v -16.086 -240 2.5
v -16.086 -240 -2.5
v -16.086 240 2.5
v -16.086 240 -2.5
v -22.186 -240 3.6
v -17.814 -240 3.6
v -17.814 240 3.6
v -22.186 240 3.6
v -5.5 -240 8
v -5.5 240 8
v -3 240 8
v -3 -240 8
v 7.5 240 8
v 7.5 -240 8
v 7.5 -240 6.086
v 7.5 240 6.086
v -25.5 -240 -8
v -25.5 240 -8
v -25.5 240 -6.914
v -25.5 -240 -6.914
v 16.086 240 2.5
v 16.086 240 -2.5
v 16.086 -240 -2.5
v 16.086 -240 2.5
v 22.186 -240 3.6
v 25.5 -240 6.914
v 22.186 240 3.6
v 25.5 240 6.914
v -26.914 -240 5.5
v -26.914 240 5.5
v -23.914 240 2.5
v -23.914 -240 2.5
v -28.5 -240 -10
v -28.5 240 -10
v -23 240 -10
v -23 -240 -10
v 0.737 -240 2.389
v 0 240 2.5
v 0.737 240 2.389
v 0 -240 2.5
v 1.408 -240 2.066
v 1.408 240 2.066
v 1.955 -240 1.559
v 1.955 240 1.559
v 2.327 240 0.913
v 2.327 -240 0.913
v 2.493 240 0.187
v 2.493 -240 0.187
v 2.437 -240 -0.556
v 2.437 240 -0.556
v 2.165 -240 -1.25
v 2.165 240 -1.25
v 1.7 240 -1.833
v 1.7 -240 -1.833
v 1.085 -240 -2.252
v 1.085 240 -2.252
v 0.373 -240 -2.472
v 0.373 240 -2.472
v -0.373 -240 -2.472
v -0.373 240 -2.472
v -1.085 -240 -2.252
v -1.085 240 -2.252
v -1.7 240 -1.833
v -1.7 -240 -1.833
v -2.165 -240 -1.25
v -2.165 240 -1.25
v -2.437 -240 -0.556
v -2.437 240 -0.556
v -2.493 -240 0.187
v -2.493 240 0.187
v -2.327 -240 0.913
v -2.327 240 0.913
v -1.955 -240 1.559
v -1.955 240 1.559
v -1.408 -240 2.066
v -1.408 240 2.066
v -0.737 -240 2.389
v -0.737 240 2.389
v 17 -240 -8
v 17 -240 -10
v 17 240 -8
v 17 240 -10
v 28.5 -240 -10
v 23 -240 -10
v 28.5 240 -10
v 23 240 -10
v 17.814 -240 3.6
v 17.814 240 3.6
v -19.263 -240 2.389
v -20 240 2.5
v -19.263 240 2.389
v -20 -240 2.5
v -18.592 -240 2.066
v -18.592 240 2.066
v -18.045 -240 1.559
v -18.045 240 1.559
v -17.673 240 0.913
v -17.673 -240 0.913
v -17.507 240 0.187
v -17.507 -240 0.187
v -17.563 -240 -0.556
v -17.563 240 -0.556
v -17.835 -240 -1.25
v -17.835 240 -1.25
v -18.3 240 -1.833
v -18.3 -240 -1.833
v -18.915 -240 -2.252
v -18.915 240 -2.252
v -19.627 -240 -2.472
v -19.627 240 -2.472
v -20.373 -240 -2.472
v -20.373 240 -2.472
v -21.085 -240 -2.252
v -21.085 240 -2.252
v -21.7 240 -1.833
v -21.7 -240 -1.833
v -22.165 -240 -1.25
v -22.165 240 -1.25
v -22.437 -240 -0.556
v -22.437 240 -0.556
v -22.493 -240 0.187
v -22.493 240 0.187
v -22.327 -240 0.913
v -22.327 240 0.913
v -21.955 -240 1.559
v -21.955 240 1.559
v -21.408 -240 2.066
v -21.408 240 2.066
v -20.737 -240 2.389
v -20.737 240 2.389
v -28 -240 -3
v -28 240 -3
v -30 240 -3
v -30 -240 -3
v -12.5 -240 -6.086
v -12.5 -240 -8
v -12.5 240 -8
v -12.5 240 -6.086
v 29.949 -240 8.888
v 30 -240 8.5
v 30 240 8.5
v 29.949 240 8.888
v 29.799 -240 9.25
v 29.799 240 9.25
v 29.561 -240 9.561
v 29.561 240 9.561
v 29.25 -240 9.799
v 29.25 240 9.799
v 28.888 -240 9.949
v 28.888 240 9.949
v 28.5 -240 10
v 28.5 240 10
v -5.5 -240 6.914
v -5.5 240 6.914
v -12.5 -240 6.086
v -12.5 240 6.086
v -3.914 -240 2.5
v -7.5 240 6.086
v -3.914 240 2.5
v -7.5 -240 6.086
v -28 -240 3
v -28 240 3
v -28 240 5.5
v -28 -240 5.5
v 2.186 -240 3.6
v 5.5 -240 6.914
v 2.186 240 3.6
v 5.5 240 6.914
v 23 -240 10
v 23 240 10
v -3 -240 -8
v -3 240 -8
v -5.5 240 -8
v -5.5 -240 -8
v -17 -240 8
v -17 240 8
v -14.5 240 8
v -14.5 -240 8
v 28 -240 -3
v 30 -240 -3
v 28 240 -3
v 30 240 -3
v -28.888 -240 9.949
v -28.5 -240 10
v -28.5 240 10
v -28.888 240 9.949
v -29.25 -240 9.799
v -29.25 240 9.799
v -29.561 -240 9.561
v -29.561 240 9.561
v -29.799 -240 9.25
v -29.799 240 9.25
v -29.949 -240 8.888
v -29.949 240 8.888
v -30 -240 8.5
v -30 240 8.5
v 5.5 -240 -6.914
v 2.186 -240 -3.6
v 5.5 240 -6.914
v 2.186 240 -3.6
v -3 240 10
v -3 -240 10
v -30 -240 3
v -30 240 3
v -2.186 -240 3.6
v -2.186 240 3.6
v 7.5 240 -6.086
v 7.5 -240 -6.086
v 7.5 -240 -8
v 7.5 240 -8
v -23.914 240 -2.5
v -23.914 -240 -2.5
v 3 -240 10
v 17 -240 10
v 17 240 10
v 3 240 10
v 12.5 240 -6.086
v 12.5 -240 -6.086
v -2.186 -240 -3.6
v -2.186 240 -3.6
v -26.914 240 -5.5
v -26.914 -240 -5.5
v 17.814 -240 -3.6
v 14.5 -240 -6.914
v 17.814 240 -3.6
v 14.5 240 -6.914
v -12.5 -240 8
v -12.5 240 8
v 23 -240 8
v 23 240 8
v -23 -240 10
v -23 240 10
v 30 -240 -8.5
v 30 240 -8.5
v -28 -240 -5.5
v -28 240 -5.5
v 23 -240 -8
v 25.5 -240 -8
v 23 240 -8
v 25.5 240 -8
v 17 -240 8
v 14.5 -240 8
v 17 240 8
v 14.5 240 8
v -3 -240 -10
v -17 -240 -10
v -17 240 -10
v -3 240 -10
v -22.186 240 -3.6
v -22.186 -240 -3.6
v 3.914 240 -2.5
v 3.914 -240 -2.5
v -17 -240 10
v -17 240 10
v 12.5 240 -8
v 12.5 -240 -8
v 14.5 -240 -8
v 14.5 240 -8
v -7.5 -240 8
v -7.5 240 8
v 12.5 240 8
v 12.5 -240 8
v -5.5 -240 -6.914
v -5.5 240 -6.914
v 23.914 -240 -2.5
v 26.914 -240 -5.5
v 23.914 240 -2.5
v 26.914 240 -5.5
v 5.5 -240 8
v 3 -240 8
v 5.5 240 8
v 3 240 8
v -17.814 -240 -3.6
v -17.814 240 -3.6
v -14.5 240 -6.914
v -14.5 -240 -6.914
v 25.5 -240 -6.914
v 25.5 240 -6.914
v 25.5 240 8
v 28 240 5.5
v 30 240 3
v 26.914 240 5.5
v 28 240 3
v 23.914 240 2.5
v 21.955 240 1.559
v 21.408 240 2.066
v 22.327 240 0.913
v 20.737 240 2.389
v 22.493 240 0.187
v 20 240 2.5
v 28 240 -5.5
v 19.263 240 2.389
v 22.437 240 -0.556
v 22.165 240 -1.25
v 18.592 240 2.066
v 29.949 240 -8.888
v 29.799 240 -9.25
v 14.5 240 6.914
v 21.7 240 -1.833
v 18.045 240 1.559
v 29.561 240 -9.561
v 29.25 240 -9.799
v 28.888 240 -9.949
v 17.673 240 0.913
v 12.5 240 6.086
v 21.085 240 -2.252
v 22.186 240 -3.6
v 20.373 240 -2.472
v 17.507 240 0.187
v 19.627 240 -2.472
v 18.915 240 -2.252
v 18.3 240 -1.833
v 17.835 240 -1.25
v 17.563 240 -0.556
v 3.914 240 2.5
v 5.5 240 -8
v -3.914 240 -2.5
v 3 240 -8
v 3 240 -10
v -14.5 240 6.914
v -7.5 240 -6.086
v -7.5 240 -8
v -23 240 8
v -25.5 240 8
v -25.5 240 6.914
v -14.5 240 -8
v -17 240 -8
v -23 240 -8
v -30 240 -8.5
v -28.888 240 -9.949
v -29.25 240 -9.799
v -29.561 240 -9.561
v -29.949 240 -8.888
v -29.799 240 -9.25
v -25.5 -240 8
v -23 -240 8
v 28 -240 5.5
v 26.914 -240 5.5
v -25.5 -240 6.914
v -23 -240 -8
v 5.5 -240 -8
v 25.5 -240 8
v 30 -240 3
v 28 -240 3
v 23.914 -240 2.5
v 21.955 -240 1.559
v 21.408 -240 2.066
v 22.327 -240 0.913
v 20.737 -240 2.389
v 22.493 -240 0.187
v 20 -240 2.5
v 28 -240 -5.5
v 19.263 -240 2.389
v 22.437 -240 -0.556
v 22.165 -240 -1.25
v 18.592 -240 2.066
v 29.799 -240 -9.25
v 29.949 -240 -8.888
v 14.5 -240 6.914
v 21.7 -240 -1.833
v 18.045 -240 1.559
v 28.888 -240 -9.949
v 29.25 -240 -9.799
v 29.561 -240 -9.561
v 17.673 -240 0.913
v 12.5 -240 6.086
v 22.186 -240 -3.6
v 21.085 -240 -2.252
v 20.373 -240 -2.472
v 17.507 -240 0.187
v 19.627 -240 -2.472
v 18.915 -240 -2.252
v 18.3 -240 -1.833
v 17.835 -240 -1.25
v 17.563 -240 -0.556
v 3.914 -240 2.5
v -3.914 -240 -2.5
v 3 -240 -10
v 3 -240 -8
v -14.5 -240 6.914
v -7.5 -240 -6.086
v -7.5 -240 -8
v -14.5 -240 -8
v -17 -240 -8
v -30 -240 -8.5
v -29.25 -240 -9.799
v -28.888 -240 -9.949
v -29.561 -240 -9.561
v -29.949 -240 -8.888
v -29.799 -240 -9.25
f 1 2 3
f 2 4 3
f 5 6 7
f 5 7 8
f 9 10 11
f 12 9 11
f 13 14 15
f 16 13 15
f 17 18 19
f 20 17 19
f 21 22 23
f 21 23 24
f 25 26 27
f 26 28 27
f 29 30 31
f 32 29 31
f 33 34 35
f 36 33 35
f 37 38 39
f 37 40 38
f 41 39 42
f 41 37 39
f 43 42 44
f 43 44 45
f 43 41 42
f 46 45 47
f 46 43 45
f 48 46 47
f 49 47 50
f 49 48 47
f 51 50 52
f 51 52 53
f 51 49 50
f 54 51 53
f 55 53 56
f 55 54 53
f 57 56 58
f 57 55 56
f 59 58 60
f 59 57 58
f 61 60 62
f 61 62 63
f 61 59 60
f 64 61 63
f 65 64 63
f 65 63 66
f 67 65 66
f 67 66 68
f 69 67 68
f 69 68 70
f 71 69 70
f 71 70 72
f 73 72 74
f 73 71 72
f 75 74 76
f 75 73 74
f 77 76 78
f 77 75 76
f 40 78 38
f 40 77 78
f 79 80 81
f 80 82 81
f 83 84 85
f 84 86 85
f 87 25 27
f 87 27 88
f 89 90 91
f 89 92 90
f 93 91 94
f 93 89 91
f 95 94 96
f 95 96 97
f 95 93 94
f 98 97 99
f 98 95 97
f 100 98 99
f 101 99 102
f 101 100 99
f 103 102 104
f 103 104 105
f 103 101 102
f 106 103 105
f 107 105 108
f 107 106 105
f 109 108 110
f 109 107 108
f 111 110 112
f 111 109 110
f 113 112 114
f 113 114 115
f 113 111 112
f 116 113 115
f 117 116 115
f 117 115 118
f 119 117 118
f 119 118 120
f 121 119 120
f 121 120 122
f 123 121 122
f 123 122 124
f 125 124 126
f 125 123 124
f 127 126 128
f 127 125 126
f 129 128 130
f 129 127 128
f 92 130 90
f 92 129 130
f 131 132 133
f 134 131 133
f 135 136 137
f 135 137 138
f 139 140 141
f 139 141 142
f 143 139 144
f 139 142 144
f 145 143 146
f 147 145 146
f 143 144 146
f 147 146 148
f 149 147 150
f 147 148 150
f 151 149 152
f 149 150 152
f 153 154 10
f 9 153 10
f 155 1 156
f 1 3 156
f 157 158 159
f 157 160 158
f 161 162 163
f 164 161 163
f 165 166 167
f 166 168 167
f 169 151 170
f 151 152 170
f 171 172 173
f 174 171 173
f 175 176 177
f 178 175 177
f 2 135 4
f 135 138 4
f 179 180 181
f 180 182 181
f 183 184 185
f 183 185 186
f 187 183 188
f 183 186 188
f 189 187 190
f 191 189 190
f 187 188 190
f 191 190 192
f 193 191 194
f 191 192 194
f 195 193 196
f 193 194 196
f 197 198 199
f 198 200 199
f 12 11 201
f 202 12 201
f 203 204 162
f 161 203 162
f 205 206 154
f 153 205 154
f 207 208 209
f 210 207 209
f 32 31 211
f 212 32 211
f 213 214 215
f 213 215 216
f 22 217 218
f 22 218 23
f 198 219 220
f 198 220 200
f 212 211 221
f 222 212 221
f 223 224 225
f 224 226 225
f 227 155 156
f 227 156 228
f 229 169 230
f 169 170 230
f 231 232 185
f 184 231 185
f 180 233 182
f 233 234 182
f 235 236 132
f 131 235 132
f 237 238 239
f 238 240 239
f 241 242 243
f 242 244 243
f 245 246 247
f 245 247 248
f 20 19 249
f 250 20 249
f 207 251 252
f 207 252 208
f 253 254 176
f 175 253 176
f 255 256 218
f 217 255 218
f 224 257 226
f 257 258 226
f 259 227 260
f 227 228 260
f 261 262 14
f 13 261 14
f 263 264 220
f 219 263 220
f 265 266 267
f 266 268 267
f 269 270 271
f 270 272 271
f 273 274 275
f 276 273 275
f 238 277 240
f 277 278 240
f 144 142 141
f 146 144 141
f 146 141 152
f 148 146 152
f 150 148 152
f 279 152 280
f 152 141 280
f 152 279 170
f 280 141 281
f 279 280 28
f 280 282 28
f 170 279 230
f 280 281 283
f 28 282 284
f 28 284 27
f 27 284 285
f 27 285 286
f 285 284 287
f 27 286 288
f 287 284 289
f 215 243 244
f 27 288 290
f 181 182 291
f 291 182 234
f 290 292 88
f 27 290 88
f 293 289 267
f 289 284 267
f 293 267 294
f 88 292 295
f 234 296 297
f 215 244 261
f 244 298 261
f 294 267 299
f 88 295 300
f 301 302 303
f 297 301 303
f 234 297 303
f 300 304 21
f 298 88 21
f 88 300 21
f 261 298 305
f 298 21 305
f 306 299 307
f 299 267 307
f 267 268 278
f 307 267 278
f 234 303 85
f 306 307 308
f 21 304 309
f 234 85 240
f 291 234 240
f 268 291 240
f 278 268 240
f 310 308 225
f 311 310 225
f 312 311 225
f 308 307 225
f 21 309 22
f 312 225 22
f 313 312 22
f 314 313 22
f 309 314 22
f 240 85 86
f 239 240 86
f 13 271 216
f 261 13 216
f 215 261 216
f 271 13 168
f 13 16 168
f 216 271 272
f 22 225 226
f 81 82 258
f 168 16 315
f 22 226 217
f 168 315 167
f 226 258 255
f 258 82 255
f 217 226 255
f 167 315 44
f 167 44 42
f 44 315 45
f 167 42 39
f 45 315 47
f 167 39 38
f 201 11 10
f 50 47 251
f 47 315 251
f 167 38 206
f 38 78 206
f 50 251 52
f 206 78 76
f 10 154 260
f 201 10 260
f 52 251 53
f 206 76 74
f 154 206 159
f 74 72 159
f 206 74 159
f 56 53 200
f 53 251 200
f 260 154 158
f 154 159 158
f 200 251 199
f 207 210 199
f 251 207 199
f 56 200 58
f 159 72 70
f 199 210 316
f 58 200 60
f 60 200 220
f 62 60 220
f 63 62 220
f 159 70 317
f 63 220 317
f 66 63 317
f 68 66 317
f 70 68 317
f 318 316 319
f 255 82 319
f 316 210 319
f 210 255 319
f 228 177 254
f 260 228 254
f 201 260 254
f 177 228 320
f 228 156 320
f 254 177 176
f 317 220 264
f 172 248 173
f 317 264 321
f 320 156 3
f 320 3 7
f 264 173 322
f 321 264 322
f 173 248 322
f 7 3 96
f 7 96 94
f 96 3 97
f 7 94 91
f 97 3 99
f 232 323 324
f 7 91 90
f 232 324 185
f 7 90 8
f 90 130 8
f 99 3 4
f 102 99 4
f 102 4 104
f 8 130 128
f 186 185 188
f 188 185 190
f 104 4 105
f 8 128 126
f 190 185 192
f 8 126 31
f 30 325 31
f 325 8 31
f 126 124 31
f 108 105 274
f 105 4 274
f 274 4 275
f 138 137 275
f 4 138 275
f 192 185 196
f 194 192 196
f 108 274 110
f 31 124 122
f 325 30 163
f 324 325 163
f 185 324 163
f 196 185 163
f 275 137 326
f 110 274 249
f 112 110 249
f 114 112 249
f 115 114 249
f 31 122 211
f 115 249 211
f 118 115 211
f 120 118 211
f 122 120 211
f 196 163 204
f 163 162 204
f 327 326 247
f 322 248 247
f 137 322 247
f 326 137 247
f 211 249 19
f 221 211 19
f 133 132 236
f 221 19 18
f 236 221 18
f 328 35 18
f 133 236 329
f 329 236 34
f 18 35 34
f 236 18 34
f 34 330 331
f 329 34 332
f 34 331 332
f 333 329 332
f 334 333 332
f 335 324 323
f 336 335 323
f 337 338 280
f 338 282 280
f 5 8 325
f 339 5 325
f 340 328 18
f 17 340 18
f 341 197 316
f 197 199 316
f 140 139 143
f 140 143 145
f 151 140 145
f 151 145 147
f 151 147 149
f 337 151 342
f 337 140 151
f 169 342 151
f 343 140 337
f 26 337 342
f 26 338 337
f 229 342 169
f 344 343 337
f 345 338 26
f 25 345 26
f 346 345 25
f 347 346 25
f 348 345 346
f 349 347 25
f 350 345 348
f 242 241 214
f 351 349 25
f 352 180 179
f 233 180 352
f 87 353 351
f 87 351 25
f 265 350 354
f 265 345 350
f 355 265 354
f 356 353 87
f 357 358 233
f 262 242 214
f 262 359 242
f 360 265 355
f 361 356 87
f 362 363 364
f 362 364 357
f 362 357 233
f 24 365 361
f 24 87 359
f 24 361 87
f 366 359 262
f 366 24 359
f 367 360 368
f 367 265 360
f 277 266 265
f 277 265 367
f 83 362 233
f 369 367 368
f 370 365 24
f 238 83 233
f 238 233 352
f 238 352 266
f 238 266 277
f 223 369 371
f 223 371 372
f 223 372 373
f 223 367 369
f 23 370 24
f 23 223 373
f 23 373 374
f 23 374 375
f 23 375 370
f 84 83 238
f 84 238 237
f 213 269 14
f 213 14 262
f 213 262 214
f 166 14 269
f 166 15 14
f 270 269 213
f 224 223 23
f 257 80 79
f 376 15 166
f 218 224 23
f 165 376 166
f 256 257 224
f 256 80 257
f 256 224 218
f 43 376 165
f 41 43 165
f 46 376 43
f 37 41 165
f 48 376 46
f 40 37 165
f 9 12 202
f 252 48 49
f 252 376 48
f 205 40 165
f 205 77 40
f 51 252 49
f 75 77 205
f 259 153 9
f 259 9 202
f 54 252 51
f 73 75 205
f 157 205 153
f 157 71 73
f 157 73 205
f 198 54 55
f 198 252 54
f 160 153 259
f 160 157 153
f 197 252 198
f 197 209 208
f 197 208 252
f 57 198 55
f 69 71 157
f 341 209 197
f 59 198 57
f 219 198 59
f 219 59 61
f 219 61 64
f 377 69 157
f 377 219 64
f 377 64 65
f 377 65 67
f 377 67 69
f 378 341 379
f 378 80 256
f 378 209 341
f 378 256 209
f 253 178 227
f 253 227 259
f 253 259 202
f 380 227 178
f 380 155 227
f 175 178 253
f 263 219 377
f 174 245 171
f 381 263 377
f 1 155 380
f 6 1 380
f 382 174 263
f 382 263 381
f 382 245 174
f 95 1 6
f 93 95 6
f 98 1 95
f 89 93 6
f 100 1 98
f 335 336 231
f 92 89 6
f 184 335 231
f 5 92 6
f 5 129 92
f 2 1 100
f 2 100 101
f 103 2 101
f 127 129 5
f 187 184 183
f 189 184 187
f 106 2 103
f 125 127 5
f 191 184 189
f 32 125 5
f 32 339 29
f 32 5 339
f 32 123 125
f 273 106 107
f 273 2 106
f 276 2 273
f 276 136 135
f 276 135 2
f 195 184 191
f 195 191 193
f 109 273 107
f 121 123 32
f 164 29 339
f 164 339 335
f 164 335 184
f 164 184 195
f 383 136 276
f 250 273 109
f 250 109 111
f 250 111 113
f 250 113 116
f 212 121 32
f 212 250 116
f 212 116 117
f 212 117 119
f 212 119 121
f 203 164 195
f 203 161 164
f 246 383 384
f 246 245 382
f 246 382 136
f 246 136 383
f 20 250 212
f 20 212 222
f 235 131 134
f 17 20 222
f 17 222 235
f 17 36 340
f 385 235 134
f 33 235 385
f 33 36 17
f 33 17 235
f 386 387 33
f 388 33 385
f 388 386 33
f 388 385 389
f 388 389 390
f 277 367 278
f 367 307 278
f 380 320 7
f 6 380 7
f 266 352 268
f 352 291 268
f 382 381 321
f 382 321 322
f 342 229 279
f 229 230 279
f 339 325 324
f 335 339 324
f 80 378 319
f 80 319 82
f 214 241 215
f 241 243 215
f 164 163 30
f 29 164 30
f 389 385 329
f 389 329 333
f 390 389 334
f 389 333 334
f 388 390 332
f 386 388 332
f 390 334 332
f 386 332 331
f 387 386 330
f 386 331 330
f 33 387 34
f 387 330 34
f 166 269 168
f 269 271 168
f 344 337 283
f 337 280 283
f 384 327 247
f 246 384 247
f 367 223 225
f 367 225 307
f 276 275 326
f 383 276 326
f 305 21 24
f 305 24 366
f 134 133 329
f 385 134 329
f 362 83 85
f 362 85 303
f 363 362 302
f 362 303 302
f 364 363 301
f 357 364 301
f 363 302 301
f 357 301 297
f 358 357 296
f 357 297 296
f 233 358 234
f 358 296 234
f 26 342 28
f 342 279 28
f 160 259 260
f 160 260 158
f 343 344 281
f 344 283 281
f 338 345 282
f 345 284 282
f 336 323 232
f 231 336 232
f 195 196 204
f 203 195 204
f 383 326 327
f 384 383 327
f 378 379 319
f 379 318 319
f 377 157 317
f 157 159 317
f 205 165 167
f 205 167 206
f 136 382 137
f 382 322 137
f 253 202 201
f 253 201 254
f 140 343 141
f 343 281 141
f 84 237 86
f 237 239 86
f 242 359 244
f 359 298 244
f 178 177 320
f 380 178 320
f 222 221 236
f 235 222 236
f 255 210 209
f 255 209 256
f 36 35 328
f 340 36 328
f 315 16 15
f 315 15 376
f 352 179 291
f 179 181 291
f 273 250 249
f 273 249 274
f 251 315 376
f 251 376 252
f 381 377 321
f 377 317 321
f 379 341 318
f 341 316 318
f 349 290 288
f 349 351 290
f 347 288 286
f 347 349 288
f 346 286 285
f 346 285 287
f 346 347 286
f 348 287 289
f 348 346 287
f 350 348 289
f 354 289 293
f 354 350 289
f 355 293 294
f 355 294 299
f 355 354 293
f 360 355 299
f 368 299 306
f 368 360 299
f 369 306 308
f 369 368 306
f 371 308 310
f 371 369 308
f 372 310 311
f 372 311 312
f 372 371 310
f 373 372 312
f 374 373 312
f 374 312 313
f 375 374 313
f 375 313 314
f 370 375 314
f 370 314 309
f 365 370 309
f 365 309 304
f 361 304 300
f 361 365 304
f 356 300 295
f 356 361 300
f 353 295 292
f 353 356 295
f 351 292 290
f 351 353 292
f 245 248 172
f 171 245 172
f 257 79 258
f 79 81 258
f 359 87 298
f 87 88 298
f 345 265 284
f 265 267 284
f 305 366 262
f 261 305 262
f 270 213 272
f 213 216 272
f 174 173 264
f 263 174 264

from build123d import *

# Parameters (mm, degrees)
SKETCH1_R           = 2.5
BOSS_EXTRUDE1_DEPTH = 240


with BuildPart() as part:
    # Sketch1 → Boss-Extrude1 (new, symmetric)
    with BuildSketch(Plane(origin=(0, 0, 0), x_dir=(1, 0, 0), z_dir=(0, 1, 0))):
        with BuildLine():
            Line((-2.185786438, 3.6), (2.185786438, 3.6))
            Line((2.185786438, 3.6), (5.5, 6.914213562))
            Line((5.5, 6.914213562), (5.5, 8))
            Line((5.5, 8), (3, 8))
            Line((3, 8), (3, 10))
            Line((3, 10), (17, 10))
            Line((17, 10), (17, 8))
            Line((17, 8), (14.5, 8))
            Line((14.5, 8), (14.5, 6.914213562))
            Line((14.5, 6.914213562), (17.814213562, 3.6))
            Line((17.814213562, 3.6), (22.185786438, 3.6))
            Line((22.185786438, 3.6), (25.5, 6.914213562))
            Line((25.5, 6.914213562), (25.5, 8))
            Line((25.5, 8), (23, 8))
            Line((23, 8), (23, 10))
            Line((23, 10), (28.5, 10))
            ThreePointArc((28.5, 10), (29.560660172, 9.560660172), (30, 8.5))
            Line((30, 8.5), (30, 3))
            Line((30, 3), (28, 3))
            Line((28, 3), (28, 5.5))
            Line((28, 5.5), (26.914213562, 5.5))
            Line((26.914213562, 5.5), (23.914213562, 2.5))
            Line((23.914213562, 2.5), (23.914213562, -2.5))
            Line((23.914213562, -2.5), (26.914213562, -5.5))
            Line((26.914213562, -5.5), (28, -5.5))
            Line((28, -5.5), (28, -3))
            Line((28, -3), (30, -3))
            Line((30, -3), (30, -8.5))
            ThreePointArc((30, -8.5), (29.560660172, -9.560660172), (28.5, -10))
            Line((28.5, -10), (23, -10))
            Line((23, -10), (23, -8))
            Line((23, -8), (25.5, -8))
            Line((25.5, -8), (25.5, -6.914213562))
            Line((25.5, -6.914213562), (22.185786438, -3.6))
            Line((22.185786438, -3.6), (17.814213562, -3.6))
            Line((17.814213562, -3.6), (14.5, -6.914213562))
            Line((14.5, -6.914213562), (14.5, -8))
            Line((14.5, -8), (17, -8))
            Line((17, -8), (17, -10))
            Line((17, -10), (3, -10))
            Line((3, -10), (3, -8))
            Line((3, -8), (5.5, -8))
            Line((5.5, -8), (5.5, -6.914213562))
            Line((5.5, -6.914213562), (2.185786438, -3.6))
            Line((2.185786438, -3.6), (-2.185786438, -3.6))
            Line((-2.185786438, -3.6), (-5.5, -6.914213562))
            Line((-5.5, -6.914213562), (-5.5, -8))
            Line((-5.5, -8), (-3, -8))
            Line((-3, -8), (-3, -10))
            Line((-3, -10), (-17, -10))
            Line((-17, -10), (-17, -8))
            Line((-17, -8), (-14.5, -8))
            Line((-14.5, -8), (-14.5, -6.914213562))
            Line((-14.5, -6.914213562), (-17.814213562, -3.6))
            Line((-17.814213562, -3.6), (-22.185786438, -3.6))
            Line((-22.185786438, -3.6), (-25.5, -6.914213562))
            Line((-25.5, -6.914213562), (-25.5, -8))
            Line((-25.5, -8), (-23, -8))
            Line((-23, -8), (-23, -10))
            Line((-23, -10), (-28.5, -10))
            ThreePointArc((-28.5, -10), (-29.560660172, -9.560660172), (-30, -8.5))
            Line((-30, -8.5), (-30, -3))
            Line((-30, -3), (-28, -3))
            Line((-28, -3), (-28, -5.5))
            Line((-28, -5.5), (-26.914213562, -5.5))
            Line((-26.914213562, -5.5), (-23.914213562, -2.5))
            Line((-23.914213562, -2.5), (-23.914213562, 2.5))
            Line((-23.914213562, 2.5), (-26.914213562, 5.5))
            Line((-26.914213562, 5.5), (-28, 5.5))
            Line((-28, 5.5), (-28, 3))
            Line((-28, 3), (-30, 3))
            Line((-30, 3), (-30, 8.5))
            ThreePointArc((-30, 8.5), (-29.560660172, 9.560660172), (-28.5, 10))
            Line((-28.5, 10), (-23, 10))
            Line((-23, 10), (-23, 8))
            Line((-23, 8), (-25.5, 8))
            Line((-25.5, 8), (-25.5, 6.914213562))
            Line((-25.5, 6.914213562), (-22.185786438, 3.6))
            Line((-22.185786438, 3.6), (-17.814213562, 3.6))
            Line((-17.814213562, 3.6), (-14.5, 6.914213562))
            Line((-14.5, 6.914213562), (-14.5, 8))
            Line((-14.5, 8), (-17, 8))
            Line((-17, 8), (-17, 10))
            Line((-17, 10), (-3, 10))
            Line((-3, 10), (-3, 8))
            Line((-3, 8), (-5.5, 8))
            Line((-5.5, 8), (-5.5, 6.914213562))
            Line((-5.5, 6.914213562), (-2.185786438, 3.6))
        make_face()
        with Locations(Location((0, 0, 0), (0, 0, 270))):
            Circle(SKETCH1_R, mode=Mode.SUBTRACT)
        with Locations(Location((20, 0, 0), (0, 0, 270))):
            Circle(SKETCH1_R, mode=Mode.SUBTRACT)
        with Locations(Location((-20, 0, 0), (0, 0, 270))):
            Circle(SKETCH1_R, mode=Mode.SUBTRACT)
        Polygon((7.5, 8), (12.5, 8), (12.5, 6.085786438), (16.085786438, 2.5), (16.085786438, -2.5), (12.5, -6.085786438), (12.5, -8), (7.5, -8), (7.5, -6.085786438), (3.914213562, -2.5), (3.914213562, 2.5), (7.5, 6.085786438), align=None, mode=Mode.SUBTRACT)
        Polygon((-7.5, -6.085786438), (-3.914213562, -2.5), (-3.914213562, 2.5), (-7.5, 6.085786438), (-7.5, 8), (-12.5, 8), (-12.5, 6.085786438), (-16.085786438, 2.5), (-16.085786438, -2.5), (-12.5, -6.085786438), (-12.5, -8), (-7.5, -8), align=None, mode=Mode.SUBTRACT)
    extrude(amount=BOSS_EXTRUDE1_DEPTH, both=True)


solid = part.part
